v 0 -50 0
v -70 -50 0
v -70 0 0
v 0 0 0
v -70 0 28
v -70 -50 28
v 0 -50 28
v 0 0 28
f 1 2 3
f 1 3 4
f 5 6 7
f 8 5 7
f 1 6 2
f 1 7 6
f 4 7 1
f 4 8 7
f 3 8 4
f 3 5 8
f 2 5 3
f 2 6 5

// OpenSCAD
// Two-part enclosure for a small electronics board (e.g. Arduino-based temperature logger)
// Print orientation: both parts rest on the bed (z = 0), build upward, side by side on the bed.
// The lid is printed upside down: a flat plate on the bed with a lip that drops into the box.

// ---------------- Parameters ----------------
box_x      = 70;    // box outer length (X)
box_y      = 50;    // box outer width (Y)
box_z      = 30;    // box outer height (Z)
box_wall   = 2;     // box wall thickness (sides and floor)
box_floor  = 2;     // box floor thickness (separate from side walls per the given dimensions)

lip_t      = 1.5;   // lip wall thickness
lip_h      = 4;     // lip height above the plate it crowns
lip_x      = 65.6;  // outer lip length (X); clearance per side = (box_x - lip_x) / 2 = 2.2 mm
lip_y      = 45.6;  // outer lip width (Y); clearance per side = (box_y - lip_y) / 2 = 2.2 mm

plate_t    = 2;     // lid plate thickness (the flat base lying on the bed)

gap        = 10;    // bed gap between the two parts (inner edges in X)

eps        = 0.5;   // cutter overshoot past faces

$fn = 64;

// ---------------- Model ----------------
union() {
    // Part 1: open-top box
    translate([-box_x / 2, -box_y / 2, 0])
        linear_extrude(height = box_z - box_floor)
            hull() {
                translate([-box_x / 2, -box_y / 2]) square([box_x, box_y]);   // floor
                translate([-box_x / 2 + box_wall, -box_y / 2 + box_wall])
                    square([box_x - 2 * box_wall, box_y - 2 * box_wall]);   // open top
            }

    // Part 2: lid, printed upside down
    translate([-(box_x - lip_x) / 2 + gap, -(box_y - lip_y) / 2, 0])
        union() {
            // base plate
            translate([-lip_x / 2, -lip_y / 2])
                square([lip_x, lip_y]);
            // lip (wall) on top of the plate
            translate([-lip_x / 2, -lip_y / 2, plate_t])
                cube([lip_x, lip_y, lip_h]);
        }
}
